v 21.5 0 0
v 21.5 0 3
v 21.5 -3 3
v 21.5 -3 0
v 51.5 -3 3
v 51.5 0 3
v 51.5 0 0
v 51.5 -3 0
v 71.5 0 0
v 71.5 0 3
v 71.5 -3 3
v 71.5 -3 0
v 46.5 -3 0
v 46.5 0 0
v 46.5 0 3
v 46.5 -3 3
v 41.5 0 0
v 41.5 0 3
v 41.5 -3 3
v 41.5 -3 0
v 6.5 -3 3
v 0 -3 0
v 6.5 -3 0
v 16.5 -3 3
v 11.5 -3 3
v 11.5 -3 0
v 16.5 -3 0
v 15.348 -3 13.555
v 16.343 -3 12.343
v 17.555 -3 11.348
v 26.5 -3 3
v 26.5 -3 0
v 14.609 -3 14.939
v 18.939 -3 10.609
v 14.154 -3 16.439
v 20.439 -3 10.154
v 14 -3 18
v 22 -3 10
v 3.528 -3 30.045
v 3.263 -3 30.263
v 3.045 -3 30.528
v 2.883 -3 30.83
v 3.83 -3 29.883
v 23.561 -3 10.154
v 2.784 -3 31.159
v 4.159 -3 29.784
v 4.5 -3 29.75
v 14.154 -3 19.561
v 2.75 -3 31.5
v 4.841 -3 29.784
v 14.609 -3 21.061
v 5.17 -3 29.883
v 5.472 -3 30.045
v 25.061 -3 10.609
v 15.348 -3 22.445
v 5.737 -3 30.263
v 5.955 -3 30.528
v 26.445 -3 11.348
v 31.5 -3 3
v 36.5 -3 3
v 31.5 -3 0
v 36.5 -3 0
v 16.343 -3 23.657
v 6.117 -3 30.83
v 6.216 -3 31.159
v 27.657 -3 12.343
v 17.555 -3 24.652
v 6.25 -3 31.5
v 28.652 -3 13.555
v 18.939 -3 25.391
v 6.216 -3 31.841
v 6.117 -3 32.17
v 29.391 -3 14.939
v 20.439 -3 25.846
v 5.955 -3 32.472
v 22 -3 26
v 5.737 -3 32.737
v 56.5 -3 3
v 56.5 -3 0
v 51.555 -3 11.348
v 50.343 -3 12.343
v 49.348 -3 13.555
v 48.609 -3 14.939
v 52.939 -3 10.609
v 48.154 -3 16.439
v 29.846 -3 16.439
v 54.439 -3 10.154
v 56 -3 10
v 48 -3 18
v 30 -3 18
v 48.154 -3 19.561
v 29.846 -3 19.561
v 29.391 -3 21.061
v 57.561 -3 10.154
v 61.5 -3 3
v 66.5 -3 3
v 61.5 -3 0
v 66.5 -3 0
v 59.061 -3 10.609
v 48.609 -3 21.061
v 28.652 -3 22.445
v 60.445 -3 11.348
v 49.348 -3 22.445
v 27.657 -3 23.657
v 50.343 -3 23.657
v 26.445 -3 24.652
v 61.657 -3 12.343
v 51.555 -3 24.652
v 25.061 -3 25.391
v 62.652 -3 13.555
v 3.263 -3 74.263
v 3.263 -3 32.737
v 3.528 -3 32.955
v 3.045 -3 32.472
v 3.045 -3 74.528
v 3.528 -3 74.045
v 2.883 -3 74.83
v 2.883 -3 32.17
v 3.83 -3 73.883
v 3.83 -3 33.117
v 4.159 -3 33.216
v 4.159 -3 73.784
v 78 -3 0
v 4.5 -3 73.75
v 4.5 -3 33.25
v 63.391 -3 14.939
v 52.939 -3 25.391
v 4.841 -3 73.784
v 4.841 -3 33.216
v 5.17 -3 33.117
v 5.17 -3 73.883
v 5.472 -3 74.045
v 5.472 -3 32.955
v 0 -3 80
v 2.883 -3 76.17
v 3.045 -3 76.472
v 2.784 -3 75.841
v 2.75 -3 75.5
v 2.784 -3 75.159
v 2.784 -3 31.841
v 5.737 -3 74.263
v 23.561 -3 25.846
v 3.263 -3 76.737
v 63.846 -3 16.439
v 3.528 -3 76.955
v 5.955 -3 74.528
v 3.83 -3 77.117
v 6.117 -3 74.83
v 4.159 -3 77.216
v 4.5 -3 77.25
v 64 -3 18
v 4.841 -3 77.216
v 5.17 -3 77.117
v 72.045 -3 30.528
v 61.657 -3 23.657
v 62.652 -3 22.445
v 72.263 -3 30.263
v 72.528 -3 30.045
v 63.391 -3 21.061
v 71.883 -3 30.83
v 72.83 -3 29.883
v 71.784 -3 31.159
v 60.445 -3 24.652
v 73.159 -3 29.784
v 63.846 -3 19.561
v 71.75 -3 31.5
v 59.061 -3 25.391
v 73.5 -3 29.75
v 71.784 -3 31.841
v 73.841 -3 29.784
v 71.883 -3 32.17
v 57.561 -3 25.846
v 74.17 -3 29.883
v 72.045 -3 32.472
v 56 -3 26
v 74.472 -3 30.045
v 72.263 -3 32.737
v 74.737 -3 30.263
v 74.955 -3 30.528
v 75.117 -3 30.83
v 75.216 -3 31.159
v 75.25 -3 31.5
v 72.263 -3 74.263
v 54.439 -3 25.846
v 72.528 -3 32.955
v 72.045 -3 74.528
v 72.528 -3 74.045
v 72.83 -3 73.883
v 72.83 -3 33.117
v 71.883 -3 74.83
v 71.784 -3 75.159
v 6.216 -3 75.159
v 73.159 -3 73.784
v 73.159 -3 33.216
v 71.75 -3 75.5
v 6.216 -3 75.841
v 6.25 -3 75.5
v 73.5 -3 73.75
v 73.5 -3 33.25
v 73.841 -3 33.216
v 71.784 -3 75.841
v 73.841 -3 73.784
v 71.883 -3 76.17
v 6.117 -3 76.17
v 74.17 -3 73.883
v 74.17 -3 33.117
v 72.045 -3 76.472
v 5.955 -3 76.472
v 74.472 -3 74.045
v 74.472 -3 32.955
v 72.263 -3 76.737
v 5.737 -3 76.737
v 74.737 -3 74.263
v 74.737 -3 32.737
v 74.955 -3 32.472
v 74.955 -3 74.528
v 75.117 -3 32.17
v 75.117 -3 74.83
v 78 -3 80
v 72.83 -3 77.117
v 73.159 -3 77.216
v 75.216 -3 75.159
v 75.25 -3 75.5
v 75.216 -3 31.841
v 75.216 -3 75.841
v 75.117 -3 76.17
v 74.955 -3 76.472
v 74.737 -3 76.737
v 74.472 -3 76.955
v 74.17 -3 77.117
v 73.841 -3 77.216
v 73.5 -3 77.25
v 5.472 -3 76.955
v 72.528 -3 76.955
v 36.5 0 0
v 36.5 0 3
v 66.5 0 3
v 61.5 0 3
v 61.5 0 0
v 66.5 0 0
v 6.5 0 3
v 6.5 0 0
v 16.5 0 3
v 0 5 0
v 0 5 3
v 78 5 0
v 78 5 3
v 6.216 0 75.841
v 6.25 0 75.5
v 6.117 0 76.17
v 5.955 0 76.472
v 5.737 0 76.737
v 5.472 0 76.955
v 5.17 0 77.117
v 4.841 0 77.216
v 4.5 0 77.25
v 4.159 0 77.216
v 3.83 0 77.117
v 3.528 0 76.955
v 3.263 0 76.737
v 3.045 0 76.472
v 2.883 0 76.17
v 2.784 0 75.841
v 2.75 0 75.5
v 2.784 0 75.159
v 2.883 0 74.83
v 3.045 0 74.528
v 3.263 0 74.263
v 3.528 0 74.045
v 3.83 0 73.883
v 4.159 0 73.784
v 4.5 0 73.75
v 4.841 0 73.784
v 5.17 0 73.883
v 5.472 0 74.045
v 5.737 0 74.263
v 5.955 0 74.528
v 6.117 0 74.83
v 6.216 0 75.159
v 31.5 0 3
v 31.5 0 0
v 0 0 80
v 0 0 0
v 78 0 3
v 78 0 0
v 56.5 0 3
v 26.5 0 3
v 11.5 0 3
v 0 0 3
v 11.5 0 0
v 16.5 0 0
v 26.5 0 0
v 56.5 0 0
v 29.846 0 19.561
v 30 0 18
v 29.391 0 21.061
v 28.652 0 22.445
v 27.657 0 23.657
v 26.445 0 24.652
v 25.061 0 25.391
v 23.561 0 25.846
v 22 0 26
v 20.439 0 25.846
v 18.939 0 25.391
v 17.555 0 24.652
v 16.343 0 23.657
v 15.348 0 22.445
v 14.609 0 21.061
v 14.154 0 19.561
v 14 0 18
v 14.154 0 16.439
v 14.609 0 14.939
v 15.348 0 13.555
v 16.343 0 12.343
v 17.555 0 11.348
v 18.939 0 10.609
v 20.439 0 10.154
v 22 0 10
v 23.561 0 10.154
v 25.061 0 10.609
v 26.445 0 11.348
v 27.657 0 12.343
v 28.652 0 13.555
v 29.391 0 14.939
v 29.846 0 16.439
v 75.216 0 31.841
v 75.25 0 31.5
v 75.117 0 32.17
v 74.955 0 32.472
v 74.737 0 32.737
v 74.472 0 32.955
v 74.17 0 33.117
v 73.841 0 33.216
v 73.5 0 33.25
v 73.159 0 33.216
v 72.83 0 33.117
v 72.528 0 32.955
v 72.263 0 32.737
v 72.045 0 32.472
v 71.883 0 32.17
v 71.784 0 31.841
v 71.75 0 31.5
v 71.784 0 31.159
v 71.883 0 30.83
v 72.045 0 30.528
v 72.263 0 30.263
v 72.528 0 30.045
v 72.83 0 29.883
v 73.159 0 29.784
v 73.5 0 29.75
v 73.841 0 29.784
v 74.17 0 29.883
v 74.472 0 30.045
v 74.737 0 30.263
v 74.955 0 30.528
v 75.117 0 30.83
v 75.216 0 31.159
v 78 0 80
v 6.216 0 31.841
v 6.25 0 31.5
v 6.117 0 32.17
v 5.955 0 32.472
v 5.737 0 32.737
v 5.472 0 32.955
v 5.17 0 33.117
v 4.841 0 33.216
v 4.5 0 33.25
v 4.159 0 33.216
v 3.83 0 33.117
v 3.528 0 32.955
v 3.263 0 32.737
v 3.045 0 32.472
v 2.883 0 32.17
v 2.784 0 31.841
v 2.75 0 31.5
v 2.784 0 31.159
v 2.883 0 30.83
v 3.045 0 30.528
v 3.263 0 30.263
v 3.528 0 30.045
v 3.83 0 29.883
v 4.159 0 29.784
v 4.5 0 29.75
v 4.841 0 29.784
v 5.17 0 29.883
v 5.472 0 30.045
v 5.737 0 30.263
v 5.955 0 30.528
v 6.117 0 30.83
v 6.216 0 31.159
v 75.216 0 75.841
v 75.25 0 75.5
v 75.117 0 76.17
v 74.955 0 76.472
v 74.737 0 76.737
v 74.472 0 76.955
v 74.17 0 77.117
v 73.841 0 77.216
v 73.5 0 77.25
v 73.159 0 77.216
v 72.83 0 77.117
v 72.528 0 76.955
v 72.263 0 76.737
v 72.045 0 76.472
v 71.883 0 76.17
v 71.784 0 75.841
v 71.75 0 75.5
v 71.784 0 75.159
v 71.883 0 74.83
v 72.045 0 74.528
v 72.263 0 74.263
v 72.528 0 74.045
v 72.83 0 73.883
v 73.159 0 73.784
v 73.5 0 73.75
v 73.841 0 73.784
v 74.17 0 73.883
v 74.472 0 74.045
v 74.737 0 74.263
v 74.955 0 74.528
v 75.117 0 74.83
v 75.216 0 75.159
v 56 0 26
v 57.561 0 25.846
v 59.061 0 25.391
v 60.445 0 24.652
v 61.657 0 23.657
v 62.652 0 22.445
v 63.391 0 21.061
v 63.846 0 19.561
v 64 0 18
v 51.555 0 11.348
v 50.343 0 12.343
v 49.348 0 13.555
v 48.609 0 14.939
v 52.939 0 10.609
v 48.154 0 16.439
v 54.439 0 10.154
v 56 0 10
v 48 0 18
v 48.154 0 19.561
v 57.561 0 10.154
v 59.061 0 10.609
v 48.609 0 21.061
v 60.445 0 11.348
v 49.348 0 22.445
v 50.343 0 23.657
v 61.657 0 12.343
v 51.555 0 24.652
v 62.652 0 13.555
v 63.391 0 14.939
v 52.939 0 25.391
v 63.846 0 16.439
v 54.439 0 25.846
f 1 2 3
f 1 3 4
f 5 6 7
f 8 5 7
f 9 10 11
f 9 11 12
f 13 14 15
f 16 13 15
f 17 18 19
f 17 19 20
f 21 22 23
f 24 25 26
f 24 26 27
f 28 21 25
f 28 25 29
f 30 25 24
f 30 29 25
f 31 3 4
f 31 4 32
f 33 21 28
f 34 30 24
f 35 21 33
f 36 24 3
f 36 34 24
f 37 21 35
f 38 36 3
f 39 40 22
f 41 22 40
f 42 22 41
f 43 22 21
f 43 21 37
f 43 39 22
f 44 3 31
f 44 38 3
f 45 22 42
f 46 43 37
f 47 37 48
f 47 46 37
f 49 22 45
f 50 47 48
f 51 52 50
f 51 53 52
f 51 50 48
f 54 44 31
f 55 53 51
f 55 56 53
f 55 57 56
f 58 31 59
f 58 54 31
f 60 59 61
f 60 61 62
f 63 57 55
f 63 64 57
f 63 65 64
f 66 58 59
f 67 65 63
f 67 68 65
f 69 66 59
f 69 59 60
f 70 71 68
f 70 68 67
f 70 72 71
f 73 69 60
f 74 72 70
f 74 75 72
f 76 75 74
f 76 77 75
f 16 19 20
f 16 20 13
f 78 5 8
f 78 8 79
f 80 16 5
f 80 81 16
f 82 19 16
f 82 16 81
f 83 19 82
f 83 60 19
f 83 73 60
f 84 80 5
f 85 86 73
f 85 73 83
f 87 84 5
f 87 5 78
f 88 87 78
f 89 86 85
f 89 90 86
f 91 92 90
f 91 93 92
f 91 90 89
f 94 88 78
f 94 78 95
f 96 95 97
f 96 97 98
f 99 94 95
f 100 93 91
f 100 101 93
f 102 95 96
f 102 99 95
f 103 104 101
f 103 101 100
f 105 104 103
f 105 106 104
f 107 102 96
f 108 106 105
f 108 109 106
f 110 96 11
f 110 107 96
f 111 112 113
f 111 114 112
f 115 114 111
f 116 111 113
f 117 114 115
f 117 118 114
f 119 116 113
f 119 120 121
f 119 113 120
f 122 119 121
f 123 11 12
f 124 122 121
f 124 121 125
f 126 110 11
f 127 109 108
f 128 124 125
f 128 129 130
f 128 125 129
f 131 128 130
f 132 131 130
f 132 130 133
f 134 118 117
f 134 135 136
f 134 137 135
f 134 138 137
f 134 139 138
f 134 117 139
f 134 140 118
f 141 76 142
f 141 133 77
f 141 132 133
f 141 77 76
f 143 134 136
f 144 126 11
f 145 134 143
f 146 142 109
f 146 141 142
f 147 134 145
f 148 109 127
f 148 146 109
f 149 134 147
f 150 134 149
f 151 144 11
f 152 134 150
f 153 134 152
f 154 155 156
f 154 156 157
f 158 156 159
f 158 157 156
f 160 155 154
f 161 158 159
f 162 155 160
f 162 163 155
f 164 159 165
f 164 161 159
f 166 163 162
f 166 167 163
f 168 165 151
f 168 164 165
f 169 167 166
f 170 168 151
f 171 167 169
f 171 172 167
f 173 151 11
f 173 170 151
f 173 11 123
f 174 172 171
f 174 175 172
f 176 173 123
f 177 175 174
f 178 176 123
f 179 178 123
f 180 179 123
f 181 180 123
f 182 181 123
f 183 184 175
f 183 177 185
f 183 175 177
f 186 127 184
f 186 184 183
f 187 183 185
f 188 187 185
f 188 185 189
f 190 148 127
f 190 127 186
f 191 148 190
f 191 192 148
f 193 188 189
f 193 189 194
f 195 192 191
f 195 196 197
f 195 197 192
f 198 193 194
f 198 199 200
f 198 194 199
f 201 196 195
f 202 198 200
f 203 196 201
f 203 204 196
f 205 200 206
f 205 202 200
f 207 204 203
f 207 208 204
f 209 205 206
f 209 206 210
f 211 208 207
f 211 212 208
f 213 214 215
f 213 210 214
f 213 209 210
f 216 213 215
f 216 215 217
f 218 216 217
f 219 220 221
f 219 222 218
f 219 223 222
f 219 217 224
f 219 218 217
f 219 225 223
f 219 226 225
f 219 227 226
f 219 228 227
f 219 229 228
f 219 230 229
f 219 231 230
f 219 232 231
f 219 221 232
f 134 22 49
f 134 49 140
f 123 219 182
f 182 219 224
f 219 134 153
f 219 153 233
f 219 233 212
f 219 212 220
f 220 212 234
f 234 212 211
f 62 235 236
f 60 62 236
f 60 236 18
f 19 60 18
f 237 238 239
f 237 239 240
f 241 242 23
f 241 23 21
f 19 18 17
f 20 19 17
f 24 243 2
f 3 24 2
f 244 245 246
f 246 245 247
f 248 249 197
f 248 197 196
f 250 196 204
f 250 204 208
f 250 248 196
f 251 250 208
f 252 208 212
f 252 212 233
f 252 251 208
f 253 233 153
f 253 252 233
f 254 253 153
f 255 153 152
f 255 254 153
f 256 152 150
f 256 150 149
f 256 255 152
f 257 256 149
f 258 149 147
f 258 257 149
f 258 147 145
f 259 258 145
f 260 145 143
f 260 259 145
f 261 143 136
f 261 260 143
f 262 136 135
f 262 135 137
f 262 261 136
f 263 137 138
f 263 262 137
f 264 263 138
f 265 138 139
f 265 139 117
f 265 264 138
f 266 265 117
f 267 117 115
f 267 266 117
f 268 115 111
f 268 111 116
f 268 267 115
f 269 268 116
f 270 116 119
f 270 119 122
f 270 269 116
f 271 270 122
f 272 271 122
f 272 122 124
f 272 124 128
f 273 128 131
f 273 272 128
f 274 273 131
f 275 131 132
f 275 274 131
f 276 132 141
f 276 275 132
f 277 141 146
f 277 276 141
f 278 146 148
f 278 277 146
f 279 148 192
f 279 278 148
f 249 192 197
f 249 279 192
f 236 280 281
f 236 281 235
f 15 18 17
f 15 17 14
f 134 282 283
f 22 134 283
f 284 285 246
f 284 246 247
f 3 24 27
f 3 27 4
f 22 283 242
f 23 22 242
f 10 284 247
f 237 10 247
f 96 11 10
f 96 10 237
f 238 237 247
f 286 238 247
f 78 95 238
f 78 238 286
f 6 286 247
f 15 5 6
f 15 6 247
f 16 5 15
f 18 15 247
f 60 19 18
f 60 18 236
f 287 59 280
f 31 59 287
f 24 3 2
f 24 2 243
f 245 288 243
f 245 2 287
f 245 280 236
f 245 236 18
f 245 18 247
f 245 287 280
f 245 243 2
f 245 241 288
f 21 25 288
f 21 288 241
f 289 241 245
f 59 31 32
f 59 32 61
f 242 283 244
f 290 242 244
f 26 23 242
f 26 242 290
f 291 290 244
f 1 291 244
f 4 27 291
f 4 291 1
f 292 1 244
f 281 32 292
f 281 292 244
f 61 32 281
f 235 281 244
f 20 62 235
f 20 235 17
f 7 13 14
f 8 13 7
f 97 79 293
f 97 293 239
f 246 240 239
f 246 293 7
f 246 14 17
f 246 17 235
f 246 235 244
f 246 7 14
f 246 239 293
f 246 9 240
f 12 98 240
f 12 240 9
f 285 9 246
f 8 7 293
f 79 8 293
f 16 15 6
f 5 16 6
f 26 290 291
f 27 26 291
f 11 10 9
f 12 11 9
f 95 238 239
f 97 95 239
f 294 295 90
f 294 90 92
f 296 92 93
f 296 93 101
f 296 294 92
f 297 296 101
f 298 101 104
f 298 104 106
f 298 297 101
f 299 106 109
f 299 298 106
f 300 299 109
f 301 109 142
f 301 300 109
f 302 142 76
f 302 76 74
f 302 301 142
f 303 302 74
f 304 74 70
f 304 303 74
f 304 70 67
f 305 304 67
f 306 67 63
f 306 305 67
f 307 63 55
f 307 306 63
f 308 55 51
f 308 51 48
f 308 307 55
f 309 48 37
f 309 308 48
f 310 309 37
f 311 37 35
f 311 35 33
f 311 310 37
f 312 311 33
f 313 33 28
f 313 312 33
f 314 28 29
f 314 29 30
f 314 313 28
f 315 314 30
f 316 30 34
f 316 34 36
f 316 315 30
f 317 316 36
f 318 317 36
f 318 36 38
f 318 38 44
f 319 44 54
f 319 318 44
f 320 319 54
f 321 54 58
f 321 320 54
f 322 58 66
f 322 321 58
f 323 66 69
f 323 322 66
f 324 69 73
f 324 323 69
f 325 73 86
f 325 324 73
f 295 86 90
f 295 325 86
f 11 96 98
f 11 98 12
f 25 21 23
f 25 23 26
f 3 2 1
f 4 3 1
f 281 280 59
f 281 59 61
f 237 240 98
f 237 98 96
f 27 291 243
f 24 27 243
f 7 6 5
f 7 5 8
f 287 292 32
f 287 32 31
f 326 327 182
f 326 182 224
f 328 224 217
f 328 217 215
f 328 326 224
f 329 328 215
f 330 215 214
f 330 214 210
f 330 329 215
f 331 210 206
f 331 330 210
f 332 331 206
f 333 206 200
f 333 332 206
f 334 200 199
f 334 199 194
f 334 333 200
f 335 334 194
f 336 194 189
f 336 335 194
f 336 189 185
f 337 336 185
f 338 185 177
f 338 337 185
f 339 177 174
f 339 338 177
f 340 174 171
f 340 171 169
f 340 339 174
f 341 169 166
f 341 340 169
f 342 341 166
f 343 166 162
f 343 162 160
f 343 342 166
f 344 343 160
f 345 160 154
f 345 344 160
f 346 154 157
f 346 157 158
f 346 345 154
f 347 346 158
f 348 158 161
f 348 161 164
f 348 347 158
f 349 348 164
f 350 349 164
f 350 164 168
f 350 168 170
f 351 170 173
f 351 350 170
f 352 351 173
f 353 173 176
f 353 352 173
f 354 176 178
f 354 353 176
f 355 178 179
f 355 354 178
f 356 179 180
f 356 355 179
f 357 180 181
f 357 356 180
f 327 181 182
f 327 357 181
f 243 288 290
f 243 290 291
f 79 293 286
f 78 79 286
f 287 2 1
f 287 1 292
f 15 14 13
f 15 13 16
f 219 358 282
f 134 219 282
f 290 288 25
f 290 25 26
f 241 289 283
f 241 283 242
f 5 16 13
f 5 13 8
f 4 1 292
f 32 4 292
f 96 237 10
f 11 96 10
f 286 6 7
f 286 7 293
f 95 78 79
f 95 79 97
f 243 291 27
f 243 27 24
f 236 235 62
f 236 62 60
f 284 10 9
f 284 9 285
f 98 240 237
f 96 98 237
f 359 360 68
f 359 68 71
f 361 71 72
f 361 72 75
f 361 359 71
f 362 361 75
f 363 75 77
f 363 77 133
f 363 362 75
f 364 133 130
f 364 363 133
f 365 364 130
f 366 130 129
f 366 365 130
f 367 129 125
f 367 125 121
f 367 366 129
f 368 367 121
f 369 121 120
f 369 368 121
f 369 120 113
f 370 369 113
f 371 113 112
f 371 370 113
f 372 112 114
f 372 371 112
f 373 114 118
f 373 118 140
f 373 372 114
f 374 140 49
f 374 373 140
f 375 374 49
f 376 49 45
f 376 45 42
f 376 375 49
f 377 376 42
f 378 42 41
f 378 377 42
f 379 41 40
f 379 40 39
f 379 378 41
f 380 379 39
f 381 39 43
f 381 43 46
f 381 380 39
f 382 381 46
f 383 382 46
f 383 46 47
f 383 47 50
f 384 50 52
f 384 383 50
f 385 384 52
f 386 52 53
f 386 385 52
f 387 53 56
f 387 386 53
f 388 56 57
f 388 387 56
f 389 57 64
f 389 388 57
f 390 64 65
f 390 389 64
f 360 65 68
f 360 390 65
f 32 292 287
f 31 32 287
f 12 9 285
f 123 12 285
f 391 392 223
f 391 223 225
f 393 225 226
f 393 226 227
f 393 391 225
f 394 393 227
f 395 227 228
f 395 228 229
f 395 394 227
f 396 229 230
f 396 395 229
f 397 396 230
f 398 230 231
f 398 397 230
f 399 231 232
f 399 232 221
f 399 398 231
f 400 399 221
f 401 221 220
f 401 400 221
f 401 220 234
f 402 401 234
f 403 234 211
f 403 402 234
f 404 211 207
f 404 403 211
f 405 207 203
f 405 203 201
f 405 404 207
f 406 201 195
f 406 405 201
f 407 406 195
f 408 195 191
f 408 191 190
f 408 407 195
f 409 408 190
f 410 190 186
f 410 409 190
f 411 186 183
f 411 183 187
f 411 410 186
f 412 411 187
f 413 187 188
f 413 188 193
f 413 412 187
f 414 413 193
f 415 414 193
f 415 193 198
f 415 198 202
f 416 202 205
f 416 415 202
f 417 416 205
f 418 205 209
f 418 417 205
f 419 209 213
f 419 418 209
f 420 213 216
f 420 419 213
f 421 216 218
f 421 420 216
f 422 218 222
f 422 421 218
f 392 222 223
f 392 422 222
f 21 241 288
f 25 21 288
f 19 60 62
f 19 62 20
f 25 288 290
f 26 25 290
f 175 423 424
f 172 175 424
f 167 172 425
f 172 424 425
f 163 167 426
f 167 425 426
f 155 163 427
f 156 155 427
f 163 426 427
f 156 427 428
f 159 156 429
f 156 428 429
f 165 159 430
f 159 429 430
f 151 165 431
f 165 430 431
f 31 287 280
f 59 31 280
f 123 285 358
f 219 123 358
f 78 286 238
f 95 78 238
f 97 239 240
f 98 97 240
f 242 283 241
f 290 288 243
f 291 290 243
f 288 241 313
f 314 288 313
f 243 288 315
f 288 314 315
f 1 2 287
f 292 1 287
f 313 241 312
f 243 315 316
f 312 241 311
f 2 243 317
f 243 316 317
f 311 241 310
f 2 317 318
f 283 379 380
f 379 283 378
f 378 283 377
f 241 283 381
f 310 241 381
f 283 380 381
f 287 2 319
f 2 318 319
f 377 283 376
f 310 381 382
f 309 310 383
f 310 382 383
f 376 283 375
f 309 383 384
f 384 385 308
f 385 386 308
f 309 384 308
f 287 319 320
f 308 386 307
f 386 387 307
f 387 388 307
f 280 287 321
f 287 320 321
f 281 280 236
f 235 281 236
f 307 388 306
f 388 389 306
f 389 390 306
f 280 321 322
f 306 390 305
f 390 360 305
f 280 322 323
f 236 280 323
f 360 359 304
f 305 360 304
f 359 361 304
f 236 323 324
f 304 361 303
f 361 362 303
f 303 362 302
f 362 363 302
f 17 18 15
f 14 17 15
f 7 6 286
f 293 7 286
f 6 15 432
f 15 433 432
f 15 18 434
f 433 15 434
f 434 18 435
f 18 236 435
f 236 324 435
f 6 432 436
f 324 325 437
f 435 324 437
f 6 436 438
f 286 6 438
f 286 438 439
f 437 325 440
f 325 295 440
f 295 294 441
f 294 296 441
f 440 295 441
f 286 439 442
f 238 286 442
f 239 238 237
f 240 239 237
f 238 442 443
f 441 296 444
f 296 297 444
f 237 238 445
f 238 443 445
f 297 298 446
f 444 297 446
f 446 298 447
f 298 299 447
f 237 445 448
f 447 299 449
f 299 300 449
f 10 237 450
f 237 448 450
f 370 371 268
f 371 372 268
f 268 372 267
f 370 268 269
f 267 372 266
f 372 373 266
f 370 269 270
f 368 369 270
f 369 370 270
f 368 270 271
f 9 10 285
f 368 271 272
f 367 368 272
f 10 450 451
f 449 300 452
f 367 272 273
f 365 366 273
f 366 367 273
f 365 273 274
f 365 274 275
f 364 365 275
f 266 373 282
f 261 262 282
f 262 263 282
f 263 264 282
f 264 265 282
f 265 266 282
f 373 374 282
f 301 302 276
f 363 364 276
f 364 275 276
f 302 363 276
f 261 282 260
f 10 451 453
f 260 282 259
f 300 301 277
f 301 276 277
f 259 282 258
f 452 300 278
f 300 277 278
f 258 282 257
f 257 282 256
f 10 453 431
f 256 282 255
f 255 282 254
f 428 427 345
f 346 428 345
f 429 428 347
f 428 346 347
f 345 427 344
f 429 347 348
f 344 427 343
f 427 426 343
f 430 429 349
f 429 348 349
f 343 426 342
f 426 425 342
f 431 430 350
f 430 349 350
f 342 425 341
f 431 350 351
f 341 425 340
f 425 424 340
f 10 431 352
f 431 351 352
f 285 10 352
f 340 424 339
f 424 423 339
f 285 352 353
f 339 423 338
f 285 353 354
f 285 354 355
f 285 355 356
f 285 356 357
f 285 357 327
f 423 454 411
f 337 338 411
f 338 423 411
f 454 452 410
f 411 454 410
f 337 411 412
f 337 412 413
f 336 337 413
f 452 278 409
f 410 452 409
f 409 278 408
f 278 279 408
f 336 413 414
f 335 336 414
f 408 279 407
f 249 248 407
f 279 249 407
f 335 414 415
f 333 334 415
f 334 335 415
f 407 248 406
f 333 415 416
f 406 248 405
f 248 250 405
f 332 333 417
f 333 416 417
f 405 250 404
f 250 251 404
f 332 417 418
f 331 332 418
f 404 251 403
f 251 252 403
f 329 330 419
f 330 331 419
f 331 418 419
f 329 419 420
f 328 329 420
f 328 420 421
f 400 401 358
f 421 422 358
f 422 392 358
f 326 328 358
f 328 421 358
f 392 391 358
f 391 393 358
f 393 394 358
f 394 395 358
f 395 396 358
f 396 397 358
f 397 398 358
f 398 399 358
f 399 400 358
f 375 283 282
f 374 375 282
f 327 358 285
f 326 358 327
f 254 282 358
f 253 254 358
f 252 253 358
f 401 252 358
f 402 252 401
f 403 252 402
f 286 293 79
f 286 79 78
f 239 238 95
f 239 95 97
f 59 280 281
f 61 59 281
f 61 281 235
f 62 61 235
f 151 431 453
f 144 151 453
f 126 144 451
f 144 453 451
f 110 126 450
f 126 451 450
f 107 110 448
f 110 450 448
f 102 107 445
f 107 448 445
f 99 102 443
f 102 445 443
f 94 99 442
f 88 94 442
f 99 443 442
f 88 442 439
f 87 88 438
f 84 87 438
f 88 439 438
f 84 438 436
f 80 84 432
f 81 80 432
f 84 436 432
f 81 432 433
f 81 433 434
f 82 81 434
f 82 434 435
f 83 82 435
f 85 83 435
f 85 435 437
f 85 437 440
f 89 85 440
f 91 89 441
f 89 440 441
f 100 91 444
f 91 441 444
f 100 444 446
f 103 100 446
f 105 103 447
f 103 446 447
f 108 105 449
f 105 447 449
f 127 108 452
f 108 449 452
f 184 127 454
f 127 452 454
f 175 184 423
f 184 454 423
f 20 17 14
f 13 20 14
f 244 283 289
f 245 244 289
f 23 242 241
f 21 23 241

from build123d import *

# Parameters (mm, degrees)
F0_R     = 8
F0_R_2   = 1.75
F1_DEPTH = 3
F2_W     = 6.5
F2_H     = 3
F2_W_2   = 5
F3_DEPTH = 8


with BuildPart() as f1:
    # F0 (on Front) → F1 (new body)
    with BuildSketch(Plane.XZ):
        Polygon((0, 80), (0, 0), (6.5, 0), (6.5, 3), (11.5, 3), (11.5, 0), (16.5, 0), (16.5, 3), (21.5, 3), (21.5, 0), (26.5, 0), (26.5, 3), (31.5, 3), (31.5, 0), (36.5, 0), (36.5, 3), (38, 3), (38, 26), (56, 26), (78, 26), (78, 80), align=None)
        with Locations((22, 18)):
            Circle(F0_R, mode=Mode.SUBTRACT)
        with Locations((4.5, 31.5)):
            Circle(F0_R_2, mode=Mode.SUBTRACT)
        with Locations((73.5, 31.5)):
            Circle(F0_R_2, mode=Mode.SUBTRACT)
        with Locations((4.5, 75.5)):
            Circle(F0_R_2, mode=Mode.SUBTRACT)
        with Locations((73.5, 75.5)):
            Circle(F0_R_2, mode=Mode.SUBTRACT)
        Polygon((78, 0), (78, 26), (56, 26), (38, 26), (38, 3), (41.5, 3), (41.5, 0), (46.5, 0), (46.5, 3), (51.5, 3), (51.5, 0), (56.5, 0), (56.5, 3), (61.5, 3), (61.5, 0), (66.5, 0), (66.5, 3), (71.5, 3), (71.5, 0), align=None)
        with BuildLine():
            ThreePointArc((64, 18), (50.3431457505, 12.3431457505), (56, 26))
            ThreePointArc((56, 26), (61.6568542495, 23.6568542495), (64, 18))
        make_face(mode=Mode.SUBTRACT)
    extrude(amount=F1_DEPTH)


with BuildPart() as f3:
    # F2 (on face) → F3 (new body)
    with BuildSketch(Plane.XZ.offset(3)):
        with Locations((3.25, 1.5)):
            Rectangle(F2_W, F2_H)
        with Locations((9, 1.5)):
            Rectangle(F2_W_2, F2_H)
        with Locations((14, 1.5)):
            Rectangle(F2_W_2, F2_H)
        with Locations((19, 1.5)):
            Rectangle(F2_W_2, F2_H)
        with Locations((24, 1.5)):
            Rectangle(F2_W_2, F2_H)
        with Locations((29, 1.5)):
            Rectangle(F2_W_2, F2_H)
        with Locations((34, 1.5)):
            Rectangle(F2_W_2, F2_H)
        with Locations((39, 1.5)):
            Rectangle(F2_W_2, F2_H)
        with Locations((44, 1.5)):
            Rectangle(F2_W_2, F2_H)
        with Locations((49, 1.5)):
            Rectangle(F2_W_2, F2_H)
        with Locations((54, 1.5)):
            Rectangle(F2_W_2, F2_H)
        with Locations((59, 1.5)):
            Rectangle(F2_W_2, F2_H)
        with Locations((64, 1.5)):
            Rectangle(F2_W_2, F2_H)
        with Locations((69, 1.5)):
            Rectangle(F2_W_2, F2_H)
        with Locations((74.75, 1.5)):
            Rectangle(F2_W, F2_H)
    extrude(amount=-F3_DEPTH)

    # F4: cut F1
    add(f1.part, mode=Mode.SUBTRACT)


solid = Compound([f1.part, f3.part])
